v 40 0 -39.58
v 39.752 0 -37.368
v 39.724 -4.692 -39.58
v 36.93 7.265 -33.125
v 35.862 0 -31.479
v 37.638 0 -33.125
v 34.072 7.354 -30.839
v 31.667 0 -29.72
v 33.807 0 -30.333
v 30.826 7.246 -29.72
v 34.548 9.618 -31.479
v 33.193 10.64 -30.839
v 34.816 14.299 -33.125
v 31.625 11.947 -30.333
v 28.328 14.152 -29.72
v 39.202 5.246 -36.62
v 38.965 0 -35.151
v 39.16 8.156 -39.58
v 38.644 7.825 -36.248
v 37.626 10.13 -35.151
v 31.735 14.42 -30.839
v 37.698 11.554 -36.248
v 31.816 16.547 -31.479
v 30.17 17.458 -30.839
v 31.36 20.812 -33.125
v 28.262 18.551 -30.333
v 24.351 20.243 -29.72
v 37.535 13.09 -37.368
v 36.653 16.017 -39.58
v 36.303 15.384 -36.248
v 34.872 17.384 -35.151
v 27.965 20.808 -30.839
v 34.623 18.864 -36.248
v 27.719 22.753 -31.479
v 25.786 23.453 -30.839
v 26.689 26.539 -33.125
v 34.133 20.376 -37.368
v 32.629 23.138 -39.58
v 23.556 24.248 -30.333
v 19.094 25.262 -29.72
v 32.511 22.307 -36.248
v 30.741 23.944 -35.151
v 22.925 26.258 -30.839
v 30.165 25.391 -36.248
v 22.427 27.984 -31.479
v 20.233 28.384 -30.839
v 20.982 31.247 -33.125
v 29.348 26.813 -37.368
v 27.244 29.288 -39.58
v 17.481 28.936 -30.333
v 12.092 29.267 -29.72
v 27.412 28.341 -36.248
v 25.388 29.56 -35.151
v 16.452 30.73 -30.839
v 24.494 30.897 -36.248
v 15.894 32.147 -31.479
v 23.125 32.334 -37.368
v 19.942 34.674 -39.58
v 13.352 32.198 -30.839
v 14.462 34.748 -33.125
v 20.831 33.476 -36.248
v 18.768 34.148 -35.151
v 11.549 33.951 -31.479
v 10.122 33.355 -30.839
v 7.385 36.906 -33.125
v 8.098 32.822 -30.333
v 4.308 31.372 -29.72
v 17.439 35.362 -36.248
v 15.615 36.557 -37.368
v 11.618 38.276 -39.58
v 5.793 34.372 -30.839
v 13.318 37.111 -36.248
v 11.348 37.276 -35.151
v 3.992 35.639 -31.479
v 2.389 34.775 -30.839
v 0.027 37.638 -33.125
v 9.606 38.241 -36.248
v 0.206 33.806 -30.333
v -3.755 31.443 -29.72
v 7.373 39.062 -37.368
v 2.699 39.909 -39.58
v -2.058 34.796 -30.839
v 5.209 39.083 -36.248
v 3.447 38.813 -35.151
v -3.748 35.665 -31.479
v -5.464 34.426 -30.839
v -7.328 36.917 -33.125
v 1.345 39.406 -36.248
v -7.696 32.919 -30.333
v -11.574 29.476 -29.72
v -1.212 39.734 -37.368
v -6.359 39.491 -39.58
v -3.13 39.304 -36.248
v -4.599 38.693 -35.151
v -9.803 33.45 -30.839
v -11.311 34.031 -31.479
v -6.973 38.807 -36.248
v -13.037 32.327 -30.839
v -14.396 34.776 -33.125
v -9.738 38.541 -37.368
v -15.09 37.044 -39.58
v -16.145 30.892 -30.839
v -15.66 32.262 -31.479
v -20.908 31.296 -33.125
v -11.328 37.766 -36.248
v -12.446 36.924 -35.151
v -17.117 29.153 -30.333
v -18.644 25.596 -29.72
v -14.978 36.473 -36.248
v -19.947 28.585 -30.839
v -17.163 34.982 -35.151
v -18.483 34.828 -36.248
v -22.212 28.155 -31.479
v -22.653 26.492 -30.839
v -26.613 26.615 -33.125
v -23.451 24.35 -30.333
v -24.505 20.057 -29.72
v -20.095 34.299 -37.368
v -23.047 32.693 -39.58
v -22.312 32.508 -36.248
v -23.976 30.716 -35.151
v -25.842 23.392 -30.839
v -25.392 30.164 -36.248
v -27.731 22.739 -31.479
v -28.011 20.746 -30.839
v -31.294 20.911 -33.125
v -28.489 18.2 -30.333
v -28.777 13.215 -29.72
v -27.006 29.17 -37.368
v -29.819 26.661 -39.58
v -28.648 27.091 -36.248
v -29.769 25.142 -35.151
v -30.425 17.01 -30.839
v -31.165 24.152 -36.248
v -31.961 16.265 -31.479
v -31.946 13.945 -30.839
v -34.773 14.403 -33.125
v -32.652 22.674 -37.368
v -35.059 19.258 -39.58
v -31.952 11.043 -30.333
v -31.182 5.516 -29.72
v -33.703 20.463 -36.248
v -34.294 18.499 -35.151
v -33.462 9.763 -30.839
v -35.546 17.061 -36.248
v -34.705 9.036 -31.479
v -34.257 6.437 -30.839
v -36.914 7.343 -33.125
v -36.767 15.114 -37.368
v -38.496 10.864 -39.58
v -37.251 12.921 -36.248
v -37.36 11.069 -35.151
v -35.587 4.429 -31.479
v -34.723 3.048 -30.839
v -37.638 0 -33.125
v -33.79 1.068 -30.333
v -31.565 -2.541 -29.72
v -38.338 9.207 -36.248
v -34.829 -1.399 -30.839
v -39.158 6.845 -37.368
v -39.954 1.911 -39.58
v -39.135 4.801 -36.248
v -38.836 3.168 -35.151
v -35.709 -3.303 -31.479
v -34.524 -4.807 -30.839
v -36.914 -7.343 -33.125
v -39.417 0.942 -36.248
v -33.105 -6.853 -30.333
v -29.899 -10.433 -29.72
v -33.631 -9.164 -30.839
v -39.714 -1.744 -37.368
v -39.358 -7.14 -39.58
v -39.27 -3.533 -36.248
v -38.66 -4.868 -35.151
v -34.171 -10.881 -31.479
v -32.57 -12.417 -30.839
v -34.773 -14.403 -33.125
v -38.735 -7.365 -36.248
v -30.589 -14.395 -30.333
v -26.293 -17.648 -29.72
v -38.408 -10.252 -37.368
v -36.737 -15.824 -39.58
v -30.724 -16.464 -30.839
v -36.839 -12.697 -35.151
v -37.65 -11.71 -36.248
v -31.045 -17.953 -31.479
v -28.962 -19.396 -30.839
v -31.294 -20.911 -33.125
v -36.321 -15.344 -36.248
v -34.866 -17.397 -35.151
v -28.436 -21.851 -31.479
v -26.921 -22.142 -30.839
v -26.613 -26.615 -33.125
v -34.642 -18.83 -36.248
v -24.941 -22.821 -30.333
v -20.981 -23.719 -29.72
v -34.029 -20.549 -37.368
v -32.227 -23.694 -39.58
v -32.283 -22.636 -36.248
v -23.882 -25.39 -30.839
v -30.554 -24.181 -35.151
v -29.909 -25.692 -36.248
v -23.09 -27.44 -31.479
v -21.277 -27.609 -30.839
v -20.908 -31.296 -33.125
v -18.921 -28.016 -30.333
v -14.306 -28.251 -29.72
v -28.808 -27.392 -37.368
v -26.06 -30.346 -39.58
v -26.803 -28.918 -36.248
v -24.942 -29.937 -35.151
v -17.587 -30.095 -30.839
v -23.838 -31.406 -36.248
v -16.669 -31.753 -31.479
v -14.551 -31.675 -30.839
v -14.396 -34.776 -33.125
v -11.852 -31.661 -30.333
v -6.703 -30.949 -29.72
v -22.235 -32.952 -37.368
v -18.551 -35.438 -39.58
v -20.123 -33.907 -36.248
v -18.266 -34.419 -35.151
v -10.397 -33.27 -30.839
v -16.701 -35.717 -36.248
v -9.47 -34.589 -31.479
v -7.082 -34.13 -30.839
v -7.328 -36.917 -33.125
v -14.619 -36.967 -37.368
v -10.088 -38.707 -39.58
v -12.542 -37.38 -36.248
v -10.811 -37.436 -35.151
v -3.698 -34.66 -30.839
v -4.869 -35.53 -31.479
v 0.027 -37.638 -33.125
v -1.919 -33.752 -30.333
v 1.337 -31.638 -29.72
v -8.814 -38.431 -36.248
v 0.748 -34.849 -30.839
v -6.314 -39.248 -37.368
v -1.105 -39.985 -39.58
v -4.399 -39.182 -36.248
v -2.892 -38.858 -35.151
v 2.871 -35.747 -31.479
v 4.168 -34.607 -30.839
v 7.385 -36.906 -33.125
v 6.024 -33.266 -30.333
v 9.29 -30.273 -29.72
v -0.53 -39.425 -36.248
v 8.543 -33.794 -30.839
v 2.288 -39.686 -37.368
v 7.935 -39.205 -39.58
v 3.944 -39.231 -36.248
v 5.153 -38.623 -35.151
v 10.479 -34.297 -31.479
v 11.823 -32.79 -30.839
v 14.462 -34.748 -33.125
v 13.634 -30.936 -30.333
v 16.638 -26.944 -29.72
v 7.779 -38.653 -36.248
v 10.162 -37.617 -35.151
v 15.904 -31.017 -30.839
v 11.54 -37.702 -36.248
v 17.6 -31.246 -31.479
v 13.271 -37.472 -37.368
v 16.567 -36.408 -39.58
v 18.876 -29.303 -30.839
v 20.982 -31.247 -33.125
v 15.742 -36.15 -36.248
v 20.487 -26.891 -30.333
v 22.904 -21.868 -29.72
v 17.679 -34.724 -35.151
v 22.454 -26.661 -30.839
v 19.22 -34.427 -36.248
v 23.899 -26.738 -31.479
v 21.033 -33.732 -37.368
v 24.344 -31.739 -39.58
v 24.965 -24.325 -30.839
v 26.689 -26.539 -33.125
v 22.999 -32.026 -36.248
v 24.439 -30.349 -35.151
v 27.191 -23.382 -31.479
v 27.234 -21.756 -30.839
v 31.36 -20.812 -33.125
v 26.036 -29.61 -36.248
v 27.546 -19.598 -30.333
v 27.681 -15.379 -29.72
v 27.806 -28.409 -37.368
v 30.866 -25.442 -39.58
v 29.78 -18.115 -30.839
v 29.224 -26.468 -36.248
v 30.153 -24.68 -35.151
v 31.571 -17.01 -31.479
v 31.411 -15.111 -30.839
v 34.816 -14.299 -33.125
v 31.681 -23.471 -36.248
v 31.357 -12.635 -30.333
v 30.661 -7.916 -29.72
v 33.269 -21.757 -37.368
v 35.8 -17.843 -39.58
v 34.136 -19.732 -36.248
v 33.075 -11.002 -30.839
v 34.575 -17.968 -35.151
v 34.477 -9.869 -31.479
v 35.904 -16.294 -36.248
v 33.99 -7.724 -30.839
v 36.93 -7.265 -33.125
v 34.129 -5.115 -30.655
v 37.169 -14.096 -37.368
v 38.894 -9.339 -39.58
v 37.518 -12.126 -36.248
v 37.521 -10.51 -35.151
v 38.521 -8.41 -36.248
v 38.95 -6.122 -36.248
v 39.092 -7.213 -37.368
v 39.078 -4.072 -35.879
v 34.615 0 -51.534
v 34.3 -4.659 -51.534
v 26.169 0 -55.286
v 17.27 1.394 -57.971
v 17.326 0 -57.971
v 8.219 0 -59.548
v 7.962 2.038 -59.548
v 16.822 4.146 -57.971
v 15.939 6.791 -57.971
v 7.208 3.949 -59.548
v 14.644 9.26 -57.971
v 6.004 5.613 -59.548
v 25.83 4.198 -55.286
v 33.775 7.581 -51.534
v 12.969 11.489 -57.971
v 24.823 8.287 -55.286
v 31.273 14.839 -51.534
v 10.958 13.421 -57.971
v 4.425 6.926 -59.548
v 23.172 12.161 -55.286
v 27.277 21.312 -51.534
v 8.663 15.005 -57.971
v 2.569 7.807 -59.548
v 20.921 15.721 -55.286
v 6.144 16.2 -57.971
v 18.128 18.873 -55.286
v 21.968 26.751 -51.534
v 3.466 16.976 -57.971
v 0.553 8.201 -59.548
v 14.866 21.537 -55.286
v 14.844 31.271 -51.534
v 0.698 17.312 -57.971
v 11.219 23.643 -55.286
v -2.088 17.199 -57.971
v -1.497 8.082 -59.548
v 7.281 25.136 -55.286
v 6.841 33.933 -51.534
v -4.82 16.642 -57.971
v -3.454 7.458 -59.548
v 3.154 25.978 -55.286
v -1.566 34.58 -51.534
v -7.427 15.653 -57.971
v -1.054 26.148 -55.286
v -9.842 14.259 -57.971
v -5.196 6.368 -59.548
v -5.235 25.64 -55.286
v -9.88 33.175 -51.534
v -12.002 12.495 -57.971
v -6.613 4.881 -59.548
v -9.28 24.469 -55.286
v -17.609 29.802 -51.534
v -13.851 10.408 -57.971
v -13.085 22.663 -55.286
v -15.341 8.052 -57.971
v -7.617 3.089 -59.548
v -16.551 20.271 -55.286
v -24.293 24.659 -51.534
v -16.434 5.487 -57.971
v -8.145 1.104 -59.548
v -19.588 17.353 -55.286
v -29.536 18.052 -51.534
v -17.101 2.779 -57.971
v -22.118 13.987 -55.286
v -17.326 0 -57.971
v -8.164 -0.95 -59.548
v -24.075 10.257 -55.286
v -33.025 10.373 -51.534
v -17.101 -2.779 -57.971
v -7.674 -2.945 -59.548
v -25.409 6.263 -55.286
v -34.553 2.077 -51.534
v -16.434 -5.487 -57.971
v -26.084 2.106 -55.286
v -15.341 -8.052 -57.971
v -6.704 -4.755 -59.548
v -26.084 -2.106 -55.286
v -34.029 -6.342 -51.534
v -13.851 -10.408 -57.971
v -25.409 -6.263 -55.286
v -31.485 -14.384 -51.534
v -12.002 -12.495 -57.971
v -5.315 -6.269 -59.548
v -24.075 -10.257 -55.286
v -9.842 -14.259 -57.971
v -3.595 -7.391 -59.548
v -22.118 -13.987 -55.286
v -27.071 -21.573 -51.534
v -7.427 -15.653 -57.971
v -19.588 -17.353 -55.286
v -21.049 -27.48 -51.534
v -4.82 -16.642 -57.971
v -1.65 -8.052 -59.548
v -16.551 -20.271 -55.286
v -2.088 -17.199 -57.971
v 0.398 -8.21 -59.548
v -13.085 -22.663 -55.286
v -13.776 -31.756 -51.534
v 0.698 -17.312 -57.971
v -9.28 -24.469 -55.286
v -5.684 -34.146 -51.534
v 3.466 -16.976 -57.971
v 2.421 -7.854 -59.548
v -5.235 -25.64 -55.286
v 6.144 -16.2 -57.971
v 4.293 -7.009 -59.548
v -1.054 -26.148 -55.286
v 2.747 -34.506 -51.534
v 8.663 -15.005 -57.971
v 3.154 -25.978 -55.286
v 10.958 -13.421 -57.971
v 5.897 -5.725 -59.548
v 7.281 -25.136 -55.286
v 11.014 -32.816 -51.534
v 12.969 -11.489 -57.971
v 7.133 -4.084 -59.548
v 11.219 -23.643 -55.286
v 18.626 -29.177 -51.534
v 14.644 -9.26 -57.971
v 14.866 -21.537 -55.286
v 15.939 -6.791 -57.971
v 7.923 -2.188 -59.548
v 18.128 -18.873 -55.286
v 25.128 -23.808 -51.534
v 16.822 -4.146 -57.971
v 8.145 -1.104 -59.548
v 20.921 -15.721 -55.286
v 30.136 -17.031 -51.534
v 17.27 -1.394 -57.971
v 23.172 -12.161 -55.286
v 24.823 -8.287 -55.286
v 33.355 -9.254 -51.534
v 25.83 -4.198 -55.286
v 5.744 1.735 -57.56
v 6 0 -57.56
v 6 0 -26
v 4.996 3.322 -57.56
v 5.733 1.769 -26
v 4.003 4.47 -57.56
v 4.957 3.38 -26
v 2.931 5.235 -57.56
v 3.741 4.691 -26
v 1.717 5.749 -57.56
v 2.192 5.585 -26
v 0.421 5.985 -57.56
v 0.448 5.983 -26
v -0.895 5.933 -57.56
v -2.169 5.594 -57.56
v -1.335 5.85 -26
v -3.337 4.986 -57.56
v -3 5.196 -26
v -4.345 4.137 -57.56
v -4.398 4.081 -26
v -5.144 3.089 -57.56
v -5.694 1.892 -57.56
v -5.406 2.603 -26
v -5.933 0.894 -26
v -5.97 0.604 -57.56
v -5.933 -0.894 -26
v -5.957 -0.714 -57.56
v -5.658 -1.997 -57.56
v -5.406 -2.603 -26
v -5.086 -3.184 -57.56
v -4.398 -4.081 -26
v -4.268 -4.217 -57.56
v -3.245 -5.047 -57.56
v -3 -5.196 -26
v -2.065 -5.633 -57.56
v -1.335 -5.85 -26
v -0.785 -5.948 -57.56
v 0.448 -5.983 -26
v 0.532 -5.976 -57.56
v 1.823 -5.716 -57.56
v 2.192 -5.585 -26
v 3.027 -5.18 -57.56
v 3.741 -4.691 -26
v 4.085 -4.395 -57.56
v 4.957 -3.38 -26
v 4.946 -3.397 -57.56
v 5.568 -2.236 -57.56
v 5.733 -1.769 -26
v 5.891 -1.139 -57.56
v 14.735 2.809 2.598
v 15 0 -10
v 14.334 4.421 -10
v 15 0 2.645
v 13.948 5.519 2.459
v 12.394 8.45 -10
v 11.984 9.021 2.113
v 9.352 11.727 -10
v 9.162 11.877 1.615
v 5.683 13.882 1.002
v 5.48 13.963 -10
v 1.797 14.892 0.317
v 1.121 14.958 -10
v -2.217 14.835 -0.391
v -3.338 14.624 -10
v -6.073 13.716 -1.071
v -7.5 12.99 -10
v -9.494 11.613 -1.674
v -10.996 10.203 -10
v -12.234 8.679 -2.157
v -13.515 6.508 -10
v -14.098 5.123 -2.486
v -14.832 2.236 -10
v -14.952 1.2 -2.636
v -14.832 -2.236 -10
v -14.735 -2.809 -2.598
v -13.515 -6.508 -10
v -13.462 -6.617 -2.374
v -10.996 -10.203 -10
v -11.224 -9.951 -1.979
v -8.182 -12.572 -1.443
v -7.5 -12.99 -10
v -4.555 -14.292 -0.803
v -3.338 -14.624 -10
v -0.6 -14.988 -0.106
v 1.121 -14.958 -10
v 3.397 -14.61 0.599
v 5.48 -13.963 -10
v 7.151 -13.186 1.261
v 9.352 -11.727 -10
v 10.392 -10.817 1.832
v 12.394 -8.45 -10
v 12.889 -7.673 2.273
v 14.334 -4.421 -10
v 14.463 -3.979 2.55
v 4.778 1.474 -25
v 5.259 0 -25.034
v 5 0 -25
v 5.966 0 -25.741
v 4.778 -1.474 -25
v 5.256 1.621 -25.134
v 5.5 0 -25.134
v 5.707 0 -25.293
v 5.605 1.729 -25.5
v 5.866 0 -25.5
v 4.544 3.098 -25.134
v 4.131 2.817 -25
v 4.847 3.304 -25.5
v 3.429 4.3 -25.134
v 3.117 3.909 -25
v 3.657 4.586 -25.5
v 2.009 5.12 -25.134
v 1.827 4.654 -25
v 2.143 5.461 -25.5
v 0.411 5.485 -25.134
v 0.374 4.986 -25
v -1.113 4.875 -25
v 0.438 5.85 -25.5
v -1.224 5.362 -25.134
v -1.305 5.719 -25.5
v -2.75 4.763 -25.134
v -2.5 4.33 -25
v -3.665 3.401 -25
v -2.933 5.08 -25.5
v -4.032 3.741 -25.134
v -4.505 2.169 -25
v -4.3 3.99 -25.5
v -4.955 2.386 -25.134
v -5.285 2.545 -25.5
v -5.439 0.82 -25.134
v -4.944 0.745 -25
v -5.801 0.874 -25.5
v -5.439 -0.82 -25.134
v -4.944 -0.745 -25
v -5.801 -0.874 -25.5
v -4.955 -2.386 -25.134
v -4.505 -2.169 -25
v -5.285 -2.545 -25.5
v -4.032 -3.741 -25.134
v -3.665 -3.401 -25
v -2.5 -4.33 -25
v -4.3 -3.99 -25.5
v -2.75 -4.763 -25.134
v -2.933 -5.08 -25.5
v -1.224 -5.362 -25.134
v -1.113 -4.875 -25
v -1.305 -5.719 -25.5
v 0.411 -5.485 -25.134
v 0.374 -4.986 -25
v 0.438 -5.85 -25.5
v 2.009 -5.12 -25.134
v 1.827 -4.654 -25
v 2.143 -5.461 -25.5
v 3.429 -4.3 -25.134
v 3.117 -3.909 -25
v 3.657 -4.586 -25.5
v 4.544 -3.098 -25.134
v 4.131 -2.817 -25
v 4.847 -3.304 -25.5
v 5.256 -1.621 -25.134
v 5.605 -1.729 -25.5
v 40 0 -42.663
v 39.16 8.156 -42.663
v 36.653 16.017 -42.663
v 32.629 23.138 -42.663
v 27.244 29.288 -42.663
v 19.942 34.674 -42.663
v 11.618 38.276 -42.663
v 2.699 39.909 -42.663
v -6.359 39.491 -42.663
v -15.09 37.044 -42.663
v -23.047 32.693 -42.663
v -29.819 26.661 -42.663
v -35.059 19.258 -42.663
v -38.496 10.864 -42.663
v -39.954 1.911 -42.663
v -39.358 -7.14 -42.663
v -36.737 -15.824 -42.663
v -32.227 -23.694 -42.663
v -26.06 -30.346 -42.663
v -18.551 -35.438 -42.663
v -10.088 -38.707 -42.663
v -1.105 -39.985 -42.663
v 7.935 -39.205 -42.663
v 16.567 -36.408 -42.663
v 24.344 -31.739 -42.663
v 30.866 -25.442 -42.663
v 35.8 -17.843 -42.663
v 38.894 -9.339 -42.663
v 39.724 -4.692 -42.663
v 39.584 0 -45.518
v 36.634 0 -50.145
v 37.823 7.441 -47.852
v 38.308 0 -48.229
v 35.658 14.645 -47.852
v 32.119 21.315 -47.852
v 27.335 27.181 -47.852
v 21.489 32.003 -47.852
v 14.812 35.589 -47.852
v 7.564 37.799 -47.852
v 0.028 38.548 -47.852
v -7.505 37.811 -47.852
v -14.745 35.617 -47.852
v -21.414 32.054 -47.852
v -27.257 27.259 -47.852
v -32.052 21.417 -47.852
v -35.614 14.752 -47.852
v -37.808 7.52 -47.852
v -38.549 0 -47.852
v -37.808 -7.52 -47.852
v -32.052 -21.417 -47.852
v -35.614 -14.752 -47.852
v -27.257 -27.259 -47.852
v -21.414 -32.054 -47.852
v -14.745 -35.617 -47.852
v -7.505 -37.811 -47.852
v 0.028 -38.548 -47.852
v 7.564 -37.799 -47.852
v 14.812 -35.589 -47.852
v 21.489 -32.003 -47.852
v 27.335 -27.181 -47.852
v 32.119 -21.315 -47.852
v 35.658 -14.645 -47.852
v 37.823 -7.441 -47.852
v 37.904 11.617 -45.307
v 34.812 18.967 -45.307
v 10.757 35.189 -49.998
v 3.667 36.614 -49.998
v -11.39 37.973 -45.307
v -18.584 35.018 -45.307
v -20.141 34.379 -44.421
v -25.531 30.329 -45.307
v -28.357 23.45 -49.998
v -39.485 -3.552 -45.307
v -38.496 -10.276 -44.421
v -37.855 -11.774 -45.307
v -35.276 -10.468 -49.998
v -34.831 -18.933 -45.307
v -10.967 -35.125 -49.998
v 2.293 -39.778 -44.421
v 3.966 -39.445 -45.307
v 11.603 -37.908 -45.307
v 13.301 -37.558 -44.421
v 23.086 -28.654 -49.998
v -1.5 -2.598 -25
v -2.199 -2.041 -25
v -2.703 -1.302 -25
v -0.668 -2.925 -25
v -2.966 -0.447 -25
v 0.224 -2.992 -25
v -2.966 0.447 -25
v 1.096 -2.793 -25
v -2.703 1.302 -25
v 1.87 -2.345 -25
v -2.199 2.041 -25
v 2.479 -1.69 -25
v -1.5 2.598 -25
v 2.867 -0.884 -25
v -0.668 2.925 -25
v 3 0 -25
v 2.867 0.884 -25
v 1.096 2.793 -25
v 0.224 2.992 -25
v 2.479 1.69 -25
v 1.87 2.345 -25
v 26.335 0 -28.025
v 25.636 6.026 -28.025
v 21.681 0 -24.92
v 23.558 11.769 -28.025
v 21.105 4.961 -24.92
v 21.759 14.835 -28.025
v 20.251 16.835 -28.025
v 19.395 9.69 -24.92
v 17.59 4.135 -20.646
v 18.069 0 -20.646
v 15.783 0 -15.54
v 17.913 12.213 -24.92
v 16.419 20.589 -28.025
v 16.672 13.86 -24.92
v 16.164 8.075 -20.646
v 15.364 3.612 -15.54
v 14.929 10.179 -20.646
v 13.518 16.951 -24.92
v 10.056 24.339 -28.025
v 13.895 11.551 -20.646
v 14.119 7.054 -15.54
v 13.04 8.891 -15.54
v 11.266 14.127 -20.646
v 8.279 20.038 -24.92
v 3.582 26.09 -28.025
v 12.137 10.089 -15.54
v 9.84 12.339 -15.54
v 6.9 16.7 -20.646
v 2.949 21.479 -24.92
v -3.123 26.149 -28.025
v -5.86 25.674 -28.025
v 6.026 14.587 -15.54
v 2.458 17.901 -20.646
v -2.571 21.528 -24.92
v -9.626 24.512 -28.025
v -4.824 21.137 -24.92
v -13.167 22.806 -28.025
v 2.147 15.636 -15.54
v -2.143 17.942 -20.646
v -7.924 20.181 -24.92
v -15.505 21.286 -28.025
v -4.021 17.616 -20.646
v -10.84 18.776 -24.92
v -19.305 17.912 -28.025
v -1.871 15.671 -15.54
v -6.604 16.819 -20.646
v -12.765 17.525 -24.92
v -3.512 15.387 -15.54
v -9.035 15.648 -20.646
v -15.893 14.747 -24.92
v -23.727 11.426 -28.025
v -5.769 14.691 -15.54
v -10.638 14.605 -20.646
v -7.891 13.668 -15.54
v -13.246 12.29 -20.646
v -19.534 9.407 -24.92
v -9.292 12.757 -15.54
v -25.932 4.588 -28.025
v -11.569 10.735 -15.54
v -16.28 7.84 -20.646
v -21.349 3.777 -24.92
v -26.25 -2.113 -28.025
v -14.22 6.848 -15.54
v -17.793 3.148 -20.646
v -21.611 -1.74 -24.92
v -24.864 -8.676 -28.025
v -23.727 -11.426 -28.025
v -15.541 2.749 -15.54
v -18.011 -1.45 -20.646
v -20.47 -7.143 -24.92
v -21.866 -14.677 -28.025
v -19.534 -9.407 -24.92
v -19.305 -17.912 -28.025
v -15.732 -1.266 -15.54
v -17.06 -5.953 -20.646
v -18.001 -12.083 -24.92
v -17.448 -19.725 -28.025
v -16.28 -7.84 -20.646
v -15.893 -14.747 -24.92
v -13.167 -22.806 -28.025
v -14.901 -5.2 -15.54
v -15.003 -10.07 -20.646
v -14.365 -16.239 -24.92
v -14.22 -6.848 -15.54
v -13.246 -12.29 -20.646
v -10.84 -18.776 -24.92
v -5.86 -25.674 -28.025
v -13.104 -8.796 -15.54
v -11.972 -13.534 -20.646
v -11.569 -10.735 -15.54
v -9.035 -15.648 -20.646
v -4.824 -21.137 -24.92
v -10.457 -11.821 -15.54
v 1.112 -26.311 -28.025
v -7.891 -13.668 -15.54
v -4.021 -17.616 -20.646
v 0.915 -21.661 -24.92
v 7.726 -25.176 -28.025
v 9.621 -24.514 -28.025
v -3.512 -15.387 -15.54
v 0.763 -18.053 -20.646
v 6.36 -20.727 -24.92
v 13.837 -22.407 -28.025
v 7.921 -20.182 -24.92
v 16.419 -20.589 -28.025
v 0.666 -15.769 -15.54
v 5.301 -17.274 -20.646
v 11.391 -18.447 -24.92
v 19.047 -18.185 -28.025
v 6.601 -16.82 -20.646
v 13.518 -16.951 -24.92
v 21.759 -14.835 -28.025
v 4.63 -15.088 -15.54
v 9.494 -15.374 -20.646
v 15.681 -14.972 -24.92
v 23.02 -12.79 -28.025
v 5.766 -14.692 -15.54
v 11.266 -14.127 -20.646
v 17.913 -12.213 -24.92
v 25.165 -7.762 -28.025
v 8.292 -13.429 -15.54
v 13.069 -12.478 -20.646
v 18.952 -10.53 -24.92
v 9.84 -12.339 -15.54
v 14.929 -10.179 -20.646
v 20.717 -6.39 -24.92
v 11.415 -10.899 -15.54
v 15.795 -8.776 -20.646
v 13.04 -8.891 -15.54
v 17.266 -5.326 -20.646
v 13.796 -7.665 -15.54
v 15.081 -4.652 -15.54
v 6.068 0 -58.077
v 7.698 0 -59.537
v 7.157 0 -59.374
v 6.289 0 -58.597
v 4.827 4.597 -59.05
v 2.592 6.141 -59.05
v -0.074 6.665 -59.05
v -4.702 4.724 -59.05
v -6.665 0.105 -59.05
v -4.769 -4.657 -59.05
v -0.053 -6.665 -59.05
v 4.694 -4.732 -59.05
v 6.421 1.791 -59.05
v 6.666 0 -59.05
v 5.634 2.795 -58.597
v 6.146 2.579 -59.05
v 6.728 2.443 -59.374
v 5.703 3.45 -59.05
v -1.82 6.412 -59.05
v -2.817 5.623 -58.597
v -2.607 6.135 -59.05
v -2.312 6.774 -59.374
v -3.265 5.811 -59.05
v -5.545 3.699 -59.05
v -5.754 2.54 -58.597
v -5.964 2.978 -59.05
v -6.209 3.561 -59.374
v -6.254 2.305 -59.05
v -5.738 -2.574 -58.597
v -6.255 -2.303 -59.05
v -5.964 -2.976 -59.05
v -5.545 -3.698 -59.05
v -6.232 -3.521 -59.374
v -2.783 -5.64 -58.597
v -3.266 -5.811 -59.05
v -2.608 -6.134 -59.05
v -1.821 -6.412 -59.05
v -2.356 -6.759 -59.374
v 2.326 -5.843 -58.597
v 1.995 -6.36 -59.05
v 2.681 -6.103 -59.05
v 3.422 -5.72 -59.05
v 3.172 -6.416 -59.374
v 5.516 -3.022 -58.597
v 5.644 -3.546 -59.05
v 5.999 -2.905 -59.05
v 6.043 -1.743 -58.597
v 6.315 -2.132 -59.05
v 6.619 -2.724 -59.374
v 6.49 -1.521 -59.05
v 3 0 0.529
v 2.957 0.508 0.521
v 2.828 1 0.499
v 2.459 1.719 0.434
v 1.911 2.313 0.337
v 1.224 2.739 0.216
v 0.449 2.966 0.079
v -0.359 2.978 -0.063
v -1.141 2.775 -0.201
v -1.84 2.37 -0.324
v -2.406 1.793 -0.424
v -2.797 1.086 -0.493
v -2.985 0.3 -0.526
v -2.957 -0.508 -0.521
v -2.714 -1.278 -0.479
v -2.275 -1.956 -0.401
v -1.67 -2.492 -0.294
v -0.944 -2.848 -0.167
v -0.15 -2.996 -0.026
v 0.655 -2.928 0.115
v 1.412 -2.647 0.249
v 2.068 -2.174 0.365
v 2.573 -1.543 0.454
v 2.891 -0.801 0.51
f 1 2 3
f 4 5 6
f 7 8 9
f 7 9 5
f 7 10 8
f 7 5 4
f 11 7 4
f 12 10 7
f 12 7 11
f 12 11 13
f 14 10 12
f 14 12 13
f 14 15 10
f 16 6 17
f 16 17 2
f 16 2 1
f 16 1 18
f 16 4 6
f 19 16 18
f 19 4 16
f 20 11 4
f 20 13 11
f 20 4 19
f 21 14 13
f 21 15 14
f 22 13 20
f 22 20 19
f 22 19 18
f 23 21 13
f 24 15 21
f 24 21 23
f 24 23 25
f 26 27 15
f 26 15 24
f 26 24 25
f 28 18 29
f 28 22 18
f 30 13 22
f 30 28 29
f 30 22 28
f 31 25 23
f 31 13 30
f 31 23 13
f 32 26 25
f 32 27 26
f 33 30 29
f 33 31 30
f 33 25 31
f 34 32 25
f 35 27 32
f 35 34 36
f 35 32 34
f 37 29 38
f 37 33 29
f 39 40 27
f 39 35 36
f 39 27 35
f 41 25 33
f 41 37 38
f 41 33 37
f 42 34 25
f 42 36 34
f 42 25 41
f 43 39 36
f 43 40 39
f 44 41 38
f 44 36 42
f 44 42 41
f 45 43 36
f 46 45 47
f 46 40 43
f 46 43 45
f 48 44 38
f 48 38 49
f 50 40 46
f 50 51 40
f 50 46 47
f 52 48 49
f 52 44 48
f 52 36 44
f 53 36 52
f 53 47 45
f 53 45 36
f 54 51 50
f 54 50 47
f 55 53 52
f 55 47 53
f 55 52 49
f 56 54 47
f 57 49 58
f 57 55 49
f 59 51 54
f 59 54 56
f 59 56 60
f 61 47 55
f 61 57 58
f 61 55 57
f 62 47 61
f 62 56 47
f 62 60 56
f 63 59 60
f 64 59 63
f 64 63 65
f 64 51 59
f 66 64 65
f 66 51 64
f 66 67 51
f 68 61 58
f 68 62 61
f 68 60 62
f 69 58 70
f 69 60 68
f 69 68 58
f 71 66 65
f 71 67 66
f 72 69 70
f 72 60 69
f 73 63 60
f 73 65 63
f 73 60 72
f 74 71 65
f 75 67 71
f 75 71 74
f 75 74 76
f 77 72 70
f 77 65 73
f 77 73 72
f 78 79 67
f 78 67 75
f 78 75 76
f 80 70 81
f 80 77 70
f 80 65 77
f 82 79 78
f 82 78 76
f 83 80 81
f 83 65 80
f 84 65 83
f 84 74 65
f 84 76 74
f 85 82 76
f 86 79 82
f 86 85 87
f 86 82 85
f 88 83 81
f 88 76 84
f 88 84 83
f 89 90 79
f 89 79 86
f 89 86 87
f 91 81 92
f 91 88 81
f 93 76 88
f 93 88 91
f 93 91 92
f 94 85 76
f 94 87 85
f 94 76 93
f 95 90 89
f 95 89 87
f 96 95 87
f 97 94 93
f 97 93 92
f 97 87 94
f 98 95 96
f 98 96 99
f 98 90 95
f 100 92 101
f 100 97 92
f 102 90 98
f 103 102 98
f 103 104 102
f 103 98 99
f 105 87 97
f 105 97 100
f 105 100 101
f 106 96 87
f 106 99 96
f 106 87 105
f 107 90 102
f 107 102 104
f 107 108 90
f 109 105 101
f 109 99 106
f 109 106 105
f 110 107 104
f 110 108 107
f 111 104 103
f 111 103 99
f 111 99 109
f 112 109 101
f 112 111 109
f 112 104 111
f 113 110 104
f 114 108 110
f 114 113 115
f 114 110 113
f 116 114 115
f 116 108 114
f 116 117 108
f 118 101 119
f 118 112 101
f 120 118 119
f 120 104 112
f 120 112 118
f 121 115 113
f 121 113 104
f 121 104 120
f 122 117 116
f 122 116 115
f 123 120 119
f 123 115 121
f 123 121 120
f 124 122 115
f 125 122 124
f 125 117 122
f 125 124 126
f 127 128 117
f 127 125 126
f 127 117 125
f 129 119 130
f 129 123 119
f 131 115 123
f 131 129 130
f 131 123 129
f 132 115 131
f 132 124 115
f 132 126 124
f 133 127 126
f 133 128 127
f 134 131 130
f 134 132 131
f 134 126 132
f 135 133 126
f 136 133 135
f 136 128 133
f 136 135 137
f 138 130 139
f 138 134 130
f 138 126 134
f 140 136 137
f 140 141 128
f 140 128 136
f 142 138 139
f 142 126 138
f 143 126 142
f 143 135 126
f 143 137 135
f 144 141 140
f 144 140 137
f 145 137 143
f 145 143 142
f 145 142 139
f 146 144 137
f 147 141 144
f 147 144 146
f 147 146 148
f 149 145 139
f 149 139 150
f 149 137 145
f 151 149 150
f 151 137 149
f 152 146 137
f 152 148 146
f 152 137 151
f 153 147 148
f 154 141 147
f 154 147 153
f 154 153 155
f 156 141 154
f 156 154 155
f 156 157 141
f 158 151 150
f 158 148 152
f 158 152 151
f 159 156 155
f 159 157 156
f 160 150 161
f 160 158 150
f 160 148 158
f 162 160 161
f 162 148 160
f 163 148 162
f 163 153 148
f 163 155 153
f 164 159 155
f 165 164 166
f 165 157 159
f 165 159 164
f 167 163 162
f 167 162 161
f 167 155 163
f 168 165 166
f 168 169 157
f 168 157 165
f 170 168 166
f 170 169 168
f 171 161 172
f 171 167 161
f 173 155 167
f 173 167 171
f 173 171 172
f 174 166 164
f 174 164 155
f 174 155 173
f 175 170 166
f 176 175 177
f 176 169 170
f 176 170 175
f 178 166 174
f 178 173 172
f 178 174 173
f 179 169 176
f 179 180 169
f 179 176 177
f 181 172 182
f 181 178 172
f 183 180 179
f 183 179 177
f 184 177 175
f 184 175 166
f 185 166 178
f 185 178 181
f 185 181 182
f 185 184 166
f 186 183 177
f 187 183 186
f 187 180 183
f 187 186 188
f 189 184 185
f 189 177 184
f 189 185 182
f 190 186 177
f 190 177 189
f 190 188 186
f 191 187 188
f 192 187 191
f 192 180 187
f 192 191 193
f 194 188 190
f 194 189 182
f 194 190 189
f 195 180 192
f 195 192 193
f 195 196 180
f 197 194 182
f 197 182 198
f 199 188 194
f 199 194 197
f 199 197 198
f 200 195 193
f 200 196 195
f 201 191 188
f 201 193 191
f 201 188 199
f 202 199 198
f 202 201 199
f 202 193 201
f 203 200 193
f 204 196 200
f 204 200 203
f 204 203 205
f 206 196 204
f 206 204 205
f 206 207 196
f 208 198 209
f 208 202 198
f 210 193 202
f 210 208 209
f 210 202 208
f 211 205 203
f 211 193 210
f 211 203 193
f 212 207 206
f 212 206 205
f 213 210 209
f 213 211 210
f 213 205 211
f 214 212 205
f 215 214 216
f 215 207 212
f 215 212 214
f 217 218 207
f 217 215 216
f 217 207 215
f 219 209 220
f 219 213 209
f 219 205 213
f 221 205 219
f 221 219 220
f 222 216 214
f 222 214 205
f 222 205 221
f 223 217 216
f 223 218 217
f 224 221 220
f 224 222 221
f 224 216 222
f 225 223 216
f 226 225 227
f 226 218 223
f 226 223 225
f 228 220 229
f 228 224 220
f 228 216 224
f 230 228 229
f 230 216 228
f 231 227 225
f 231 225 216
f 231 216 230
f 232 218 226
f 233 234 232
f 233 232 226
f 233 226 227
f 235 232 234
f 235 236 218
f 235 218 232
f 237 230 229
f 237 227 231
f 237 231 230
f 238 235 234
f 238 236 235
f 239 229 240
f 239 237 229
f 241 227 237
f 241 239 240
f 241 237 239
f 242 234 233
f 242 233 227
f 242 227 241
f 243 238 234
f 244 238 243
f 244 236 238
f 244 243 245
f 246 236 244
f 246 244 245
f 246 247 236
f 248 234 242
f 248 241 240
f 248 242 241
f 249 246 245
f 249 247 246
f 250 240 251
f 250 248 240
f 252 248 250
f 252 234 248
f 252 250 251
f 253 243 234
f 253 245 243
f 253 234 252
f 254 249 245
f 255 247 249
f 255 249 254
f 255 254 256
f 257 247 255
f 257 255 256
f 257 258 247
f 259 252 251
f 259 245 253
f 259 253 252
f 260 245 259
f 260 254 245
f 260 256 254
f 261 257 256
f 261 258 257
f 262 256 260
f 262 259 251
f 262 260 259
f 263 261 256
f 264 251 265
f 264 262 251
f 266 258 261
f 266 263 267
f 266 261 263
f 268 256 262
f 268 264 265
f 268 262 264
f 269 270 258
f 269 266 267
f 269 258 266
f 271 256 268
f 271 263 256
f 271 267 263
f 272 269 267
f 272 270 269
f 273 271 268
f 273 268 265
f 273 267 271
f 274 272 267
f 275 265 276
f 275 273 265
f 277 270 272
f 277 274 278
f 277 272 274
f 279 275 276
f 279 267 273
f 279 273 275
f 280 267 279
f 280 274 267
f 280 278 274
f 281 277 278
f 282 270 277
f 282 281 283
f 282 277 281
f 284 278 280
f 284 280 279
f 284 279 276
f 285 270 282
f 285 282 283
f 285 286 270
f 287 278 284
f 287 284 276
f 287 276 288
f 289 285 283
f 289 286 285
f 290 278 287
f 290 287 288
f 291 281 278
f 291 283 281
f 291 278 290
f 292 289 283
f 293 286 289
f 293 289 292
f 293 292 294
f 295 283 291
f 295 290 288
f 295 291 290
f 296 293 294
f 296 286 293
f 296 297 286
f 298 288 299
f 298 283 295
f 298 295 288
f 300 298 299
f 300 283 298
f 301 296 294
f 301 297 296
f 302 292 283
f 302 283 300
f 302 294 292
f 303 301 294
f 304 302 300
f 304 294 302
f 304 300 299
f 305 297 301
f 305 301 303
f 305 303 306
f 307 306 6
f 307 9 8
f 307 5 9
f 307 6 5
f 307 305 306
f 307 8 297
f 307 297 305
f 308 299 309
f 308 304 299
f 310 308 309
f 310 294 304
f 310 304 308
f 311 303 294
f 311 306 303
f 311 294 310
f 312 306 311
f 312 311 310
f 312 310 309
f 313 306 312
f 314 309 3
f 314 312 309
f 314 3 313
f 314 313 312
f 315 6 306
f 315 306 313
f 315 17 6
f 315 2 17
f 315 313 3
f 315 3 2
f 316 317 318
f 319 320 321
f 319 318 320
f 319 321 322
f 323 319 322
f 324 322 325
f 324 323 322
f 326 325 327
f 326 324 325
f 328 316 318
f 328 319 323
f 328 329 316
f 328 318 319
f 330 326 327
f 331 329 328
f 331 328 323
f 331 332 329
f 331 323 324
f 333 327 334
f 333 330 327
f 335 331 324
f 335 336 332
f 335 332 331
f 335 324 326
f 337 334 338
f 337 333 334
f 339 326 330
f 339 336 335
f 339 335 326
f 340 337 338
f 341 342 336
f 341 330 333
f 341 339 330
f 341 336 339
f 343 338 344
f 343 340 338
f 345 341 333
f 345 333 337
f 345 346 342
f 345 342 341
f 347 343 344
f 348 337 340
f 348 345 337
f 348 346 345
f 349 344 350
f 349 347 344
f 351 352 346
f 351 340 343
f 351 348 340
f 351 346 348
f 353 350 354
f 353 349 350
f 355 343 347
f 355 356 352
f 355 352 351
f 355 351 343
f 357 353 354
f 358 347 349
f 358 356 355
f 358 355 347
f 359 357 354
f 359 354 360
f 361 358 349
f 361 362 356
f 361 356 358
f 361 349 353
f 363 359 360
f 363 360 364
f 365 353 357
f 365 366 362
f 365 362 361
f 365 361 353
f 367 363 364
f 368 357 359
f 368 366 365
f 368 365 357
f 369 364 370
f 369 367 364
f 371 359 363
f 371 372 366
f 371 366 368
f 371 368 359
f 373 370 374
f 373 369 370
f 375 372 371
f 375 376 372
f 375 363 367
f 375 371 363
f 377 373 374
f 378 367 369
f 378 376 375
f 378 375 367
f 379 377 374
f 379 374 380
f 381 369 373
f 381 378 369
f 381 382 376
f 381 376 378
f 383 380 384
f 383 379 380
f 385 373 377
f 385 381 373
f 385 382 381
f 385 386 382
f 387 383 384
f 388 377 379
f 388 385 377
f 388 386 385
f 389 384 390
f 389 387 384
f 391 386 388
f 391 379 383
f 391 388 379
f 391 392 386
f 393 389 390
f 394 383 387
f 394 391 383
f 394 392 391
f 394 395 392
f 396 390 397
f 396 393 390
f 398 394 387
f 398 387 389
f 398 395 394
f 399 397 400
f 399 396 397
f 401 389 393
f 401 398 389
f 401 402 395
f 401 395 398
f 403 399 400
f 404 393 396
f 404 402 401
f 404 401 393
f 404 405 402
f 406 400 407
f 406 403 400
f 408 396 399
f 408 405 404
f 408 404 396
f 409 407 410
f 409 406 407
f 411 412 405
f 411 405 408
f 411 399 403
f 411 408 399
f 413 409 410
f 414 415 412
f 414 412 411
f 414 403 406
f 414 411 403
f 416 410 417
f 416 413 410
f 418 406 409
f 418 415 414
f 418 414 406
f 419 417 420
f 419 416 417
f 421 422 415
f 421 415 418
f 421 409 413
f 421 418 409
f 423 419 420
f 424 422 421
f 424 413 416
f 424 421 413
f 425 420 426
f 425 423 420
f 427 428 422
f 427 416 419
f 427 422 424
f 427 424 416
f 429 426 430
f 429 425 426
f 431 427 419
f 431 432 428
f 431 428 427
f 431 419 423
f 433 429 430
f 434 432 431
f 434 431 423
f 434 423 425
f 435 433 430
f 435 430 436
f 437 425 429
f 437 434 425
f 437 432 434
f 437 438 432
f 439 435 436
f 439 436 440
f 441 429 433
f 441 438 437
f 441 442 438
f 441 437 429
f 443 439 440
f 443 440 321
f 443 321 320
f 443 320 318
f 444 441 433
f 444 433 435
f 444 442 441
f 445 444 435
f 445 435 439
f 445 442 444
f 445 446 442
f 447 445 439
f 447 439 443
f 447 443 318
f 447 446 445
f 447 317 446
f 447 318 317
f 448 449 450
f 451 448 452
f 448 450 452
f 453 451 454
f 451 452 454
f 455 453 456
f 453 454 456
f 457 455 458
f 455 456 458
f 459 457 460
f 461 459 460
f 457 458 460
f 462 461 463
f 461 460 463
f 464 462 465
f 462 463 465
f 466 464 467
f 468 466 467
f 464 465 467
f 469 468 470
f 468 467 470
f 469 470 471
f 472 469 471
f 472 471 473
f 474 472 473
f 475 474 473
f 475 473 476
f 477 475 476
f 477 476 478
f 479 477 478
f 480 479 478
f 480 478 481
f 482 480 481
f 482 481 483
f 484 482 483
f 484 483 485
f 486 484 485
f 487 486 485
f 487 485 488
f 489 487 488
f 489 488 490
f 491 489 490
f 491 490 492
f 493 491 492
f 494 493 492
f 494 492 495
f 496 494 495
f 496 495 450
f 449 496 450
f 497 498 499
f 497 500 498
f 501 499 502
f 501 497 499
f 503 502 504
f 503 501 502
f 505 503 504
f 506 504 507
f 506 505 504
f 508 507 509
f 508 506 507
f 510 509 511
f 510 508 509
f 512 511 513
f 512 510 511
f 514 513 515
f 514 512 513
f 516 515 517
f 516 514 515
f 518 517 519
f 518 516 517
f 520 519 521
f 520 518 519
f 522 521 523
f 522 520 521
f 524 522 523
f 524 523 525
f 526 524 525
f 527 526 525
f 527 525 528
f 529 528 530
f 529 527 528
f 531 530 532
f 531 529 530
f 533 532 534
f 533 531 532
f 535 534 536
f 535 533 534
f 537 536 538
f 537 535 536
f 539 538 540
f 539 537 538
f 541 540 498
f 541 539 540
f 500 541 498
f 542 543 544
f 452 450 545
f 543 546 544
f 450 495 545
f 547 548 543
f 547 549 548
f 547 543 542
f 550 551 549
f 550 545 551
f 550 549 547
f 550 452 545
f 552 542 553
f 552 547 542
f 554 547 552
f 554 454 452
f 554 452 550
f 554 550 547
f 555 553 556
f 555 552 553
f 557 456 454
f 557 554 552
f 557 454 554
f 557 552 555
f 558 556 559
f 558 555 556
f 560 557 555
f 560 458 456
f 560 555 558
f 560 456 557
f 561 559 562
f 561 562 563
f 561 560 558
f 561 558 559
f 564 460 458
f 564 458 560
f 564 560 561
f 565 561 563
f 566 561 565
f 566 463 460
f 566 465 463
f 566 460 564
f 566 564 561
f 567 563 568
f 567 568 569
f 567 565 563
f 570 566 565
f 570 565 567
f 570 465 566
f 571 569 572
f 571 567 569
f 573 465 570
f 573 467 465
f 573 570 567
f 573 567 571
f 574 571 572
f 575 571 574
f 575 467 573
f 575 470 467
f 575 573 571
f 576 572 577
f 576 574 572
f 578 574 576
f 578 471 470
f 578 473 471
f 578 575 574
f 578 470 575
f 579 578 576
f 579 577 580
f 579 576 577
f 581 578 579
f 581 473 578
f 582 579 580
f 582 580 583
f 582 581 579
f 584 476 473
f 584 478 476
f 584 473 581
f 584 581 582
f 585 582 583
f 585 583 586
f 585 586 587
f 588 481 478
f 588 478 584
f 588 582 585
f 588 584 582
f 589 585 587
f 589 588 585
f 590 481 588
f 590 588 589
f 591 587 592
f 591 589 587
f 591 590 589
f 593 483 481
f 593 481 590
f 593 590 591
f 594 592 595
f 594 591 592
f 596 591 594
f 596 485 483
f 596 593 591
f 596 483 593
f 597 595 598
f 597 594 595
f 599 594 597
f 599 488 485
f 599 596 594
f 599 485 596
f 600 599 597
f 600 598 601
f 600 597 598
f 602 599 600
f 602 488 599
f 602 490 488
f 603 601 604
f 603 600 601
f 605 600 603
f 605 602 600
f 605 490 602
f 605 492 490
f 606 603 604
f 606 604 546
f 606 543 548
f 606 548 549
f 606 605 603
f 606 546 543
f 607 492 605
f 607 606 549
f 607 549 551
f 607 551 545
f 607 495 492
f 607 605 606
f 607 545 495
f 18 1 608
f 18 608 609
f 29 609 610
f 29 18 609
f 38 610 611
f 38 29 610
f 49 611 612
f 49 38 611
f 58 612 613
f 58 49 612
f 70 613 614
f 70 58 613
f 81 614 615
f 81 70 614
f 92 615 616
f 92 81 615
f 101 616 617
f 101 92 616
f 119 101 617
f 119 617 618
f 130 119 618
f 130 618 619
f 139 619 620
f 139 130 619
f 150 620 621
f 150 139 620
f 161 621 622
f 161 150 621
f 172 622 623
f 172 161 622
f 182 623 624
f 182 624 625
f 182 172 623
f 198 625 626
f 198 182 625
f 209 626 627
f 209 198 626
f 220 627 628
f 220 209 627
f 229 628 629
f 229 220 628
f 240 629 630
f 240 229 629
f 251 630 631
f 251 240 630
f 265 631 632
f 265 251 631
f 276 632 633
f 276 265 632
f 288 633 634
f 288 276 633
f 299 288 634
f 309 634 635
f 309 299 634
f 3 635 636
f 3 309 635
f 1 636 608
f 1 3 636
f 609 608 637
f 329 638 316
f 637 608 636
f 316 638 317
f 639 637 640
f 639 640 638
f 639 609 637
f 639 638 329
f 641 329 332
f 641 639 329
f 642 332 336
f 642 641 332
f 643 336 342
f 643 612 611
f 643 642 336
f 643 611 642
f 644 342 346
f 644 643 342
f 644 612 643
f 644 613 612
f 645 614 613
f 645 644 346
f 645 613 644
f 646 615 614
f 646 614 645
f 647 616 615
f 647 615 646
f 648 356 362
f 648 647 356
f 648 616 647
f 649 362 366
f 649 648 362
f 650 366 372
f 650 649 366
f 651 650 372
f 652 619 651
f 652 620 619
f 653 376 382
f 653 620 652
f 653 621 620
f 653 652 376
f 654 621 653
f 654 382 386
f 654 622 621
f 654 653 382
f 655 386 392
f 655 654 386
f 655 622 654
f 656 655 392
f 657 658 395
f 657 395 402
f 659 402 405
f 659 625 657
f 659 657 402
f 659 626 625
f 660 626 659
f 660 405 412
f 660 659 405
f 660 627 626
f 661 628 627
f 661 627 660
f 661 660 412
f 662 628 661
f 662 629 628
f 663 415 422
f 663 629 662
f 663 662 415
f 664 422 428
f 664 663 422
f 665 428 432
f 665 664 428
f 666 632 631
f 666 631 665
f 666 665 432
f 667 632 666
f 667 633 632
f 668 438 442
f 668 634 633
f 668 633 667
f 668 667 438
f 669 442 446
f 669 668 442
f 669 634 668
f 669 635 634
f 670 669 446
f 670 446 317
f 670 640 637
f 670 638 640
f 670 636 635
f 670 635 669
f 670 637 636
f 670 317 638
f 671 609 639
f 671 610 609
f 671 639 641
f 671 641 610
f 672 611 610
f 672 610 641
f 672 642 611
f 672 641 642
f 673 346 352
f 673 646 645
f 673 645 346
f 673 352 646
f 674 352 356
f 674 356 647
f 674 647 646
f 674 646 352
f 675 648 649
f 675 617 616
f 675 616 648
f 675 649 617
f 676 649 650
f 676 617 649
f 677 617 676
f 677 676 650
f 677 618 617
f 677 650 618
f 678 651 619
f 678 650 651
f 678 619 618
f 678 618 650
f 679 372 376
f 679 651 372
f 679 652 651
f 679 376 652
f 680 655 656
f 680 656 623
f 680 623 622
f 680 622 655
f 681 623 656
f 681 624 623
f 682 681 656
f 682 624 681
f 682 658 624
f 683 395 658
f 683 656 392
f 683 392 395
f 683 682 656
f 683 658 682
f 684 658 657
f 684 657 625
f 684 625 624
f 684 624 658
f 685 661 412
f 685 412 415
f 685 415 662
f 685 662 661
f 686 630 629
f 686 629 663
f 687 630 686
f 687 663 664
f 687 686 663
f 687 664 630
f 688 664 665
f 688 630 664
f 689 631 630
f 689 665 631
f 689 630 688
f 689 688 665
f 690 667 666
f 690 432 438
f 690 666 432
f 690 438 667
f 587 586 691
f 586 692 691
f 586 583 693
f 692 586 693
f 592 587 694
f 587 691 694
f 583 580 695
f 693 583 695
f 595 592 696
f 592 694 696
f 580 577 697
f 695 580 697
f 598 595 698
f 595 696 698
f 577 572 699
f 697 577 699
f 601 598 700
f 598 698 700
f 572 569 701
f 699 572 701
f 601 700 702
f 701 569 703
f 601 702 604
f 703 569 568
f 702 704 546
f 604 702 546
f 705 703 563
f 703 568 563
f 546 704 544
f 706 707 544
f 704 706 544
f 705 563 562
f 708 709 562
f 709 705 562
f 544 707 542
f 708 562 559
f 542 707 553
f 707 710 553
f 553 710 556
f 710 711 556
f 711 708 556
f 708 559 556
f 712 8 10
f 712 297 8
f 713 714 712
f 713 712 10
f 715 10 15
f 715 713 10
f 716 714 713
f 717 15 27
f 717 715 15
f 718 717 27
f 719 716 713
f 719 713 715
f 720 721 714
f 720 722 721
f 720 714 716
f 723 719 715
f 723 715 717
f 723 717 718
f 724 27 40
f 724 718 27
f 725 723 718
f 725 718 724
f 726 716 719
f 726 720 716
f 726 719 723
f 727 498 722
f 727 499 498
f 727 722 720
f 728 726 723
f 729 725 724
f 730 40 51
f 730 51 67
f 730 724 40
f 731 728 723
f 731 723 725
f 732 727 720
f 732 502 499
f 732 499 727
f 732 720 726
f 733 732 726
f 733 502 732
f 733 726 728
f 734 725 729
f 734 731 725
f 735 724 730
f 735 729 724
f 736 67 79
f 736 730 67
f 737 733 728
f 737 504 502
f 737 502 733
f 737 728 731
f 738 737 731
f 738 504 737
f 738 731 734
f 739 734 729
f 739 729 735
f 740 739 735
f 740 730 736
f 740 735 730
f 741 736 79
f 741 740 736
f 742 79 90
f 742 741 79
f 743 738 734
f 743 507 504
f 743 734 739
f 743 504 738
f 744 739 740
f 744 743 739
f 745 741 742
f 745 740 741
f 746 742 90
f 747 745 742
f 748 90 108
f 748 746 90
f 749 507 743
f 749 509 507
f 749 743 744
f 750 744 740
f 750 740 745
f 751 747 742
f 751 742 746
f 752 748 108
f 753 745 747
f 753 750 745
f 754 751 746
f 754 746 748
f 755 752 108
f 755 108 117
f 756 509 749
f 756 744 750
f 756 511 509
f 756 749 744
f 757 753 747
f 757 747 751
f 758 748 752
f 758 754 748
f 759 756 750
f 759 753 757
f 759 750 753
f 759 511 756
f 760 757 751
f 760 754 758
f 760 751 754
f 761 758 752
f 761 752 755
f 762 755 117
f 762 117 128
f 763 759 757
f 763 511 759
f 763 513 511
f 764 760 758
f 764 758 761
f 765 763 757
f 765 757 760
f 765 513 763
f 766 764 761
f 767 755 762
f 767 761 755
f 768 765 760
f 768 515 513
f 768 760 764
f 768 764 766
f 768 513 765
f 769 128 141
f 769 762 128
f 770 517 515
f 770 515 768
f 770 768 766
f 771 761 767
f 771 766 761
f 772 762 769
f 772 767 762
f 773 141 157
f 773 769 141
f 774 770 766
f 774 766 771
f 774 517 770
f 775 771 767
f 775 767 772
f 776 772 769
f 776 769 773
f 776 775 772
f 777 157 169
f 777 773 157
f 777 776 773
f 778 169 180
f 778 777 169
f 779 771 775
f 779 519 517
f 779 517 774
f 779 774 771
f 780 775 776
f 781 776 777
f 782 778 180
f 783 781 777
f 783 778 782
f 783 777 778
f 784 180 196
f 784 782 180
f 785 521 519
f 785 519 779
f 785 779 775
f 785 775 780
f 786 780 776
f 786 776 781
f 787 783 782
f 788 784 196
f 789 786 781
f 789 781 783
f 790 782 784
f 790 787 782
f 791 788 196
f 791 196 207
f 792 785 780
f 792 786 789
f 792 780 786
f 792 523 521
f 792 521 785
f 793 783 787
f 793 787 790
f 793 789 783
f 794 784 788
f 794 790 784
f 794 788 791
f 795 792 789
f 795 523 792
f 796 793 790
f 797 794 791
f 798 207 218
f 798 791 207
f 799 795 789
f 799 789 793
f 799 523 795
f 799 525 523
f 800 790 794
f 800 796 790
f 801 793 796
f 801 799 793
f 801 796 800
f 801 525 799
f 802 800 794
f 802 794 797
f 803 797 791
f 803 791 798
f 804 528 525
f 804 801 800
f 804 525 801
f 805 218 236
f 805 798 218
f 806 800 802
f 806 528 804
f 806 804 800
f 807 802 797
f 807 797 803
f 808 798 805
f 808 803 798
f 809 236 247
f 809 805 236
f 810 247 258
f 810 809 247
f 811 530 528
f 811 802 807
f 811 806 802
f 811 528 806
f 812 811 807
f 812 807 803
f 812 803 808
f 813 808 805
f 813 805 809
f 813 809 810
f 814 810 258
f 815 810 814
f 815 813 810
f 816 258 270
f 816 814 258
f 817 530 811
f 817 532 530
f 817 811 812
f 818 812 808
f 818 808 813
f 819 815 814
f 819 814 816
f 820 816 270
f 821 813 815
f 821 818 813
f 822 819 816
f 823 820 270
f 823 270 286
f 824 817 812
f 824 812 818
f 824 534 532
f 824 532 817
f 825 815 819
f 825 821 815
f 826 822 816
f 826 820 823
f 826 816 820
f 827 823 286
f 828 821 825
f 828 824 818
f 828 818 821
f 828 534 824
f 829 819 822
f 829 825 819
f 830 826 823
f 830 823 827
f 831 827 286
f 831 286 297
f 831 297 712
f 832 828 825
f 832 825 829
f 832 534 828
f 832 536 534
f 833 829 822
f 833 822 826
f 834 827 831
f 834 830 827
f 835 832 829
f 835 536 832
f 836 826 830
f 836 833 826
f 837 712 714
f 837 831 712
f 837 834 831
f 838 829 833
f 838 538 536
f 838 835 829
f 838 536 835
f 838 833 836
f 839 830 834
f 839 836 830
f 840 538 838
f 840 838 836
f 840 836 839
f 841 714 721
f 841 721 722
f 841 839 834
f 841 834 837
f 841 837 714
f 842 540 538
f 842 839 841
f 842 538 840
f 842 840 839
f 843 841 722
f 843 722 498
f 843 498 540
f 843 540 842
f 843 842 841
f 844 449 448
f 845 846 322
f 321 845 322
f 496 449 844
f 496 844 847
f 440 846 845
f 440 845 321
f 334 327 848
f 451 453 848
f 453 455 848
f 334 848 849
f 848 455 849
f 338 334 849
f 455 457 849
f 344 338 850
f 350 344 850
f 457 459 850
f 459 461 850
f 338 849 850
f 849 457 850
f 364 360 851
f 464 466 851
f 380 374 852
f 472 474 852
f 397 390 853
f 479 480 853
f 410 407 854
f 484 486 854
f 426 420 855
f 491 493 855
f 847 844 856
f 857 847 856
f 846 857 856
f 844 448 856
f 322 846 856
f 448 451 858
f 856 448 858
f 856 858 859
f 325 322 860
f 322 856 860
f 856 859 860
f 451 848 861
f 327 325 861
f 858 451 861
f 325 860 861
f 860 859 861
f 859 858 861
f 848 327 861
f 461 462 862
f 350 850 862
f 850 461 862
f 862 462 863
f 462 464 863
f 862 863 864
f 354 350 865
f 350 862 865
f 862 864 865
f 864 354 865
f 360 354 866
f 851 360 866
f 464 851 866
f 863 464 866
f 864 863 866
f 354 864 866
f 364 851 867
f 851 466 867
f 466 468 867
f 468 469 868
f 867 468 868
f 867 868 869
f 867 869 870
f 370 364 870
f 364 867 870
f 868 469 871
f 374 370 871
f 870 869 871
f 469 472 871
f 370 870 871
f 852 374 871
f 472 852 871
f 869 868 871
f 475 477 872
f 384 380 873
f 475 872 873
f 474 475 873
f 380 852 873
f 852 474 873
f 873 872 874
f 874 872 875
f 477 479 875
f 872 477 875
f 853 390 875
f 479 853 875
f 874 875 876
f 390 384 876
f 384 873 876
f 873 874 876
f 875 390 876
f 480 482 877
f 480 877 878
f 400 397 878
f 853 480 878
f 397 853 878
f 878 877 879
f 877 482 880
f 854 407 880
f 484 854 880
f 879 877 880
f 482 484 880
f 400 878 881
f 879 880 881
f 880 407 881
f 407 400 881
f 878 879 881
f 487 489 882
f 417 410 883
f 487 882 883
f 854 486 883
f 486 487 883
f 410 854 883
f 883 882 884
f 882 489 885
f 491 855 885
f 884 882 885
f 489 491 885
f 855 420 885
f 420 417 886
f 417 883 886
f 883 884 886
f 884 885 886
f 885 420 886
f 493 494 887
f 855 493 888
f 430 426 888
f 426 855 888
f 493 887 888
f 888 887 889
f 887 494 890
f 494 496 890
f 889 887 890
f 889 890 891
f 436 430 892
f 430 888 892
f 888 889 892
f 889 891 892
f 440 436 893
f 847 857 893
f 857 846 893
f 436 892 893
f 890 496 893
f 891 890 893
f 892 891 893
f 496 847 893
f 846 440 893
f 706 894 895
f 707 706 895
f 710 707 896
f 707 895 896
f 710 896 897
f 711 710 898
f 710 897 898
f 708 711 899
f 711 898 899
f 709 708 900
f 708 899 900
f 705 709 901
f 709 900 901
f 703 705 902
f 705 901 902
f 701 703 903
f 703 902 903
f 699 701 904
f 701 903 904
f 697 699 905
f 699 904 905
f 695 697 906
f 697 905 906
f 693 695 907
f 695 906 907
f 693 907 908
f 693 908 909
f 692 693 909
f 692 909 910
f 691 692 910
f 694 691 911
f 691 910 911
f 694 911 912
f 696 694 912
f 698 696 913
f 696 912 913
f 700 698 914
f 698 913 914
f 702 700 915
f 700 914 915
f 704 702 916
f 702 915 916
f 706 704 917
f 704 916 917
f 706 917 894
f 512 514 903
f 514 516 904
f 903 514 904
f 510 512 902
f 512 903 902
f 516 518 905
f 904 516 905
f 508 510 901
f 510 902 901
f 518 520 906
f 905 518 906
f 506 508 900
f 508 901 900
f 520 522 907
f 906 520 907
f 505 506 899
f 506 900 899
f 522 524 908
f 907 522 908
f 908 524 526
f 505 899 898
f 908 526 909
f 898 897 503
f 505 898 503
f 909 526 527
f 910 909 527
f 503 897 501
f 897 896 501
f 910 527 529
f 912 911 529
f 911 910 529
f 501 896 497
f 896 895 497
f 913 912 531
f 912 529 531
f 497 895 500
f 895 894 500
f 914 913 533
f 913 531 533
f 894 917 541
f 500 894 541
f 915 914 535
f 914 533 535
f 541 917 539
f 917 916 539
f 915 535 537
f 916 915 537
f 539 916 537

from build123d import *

# Parameters (mm, degrees)
F0_W      = 15
F0_H      = 5
F2_R      = 20
F3_R      = 10
F4_R      = 3
F5_DEPTH  = 100
F7_START  = -25
F6_R      = 6
F7_DEPTH  = 75
F8_R      = 1
F9_R      = 2
F11_DEPTH = 25


with BuildPart() as f1:
    # F0 (on Front) → F1 (revolve)
    with BuildSketch(Plane.XZ):
        with BuildLine():
            Line((0, 0), (0, -60))
            ThreePointArc((0, -60), (20.8180621376, -57.0528159674), (40, -48.4428877022))
            Line((40, -48.4428877022), (40, -30))
            Line((40, -30), (15, -30))
            Line((15, -30), (15, 0))
            Line((15, 0), (0, 0))
        make_face()
        with Locations((7.5, 2.5)):
            Rectangle(F0_W, F0_H)
    revolve(axis=Axis((0, 0, -30), (0, 0, 1)))

    # F2
    f2_edges = [f1.edges().sort_by_distance(p)[0] for p in [
        (-15, 0, -30),
    ]]
    fillet(f2_edges, radius=F2_R)

    # F3
    f3_edges = [f1.edges().sort_by_distance(p)[0] for p in [
        (-40, 0, -48.442888),
        (-40, 0, -30),
    ]]
    fillet(f3_edges, radius=F3_R)

    # F4 (on Top) → F5 (cut, symmetric)
    with BuildSketch(Plane.XY):
        Circle(F4_R)
    extrude(amount=F5_DEPTH, both=True, mode=Mode.SUBTRACT)

    # F6 (on Top) → F7 (cut)
    with BuildSketch(Plane.XY.offset(F7_START)):
        Circle(F6_R)
    extrude(amount=-F7_DEPTH, mode=Mode.SUBTRACT)

    # F8
    f8_edges = [f1.edges().sort_by_distance(p)[0] for p in [
        (-6, 0, -25),
    ]]
    fillet(f8_edges, radius=F8_R)

    # F9
    f9_edges = [f1.edges().sort_by_distance(p)[0] for p in [
        (-6, 0, -59.759615),
    ]]
    fillet(f9_edges, radius=F9_R)

    # F10 (on Front) → F11 (cut, symmetric)
    with BuildSketch(Plane.XZ):
        Polygon((-50, -8.8163490354), (50, 8.8163490354), (-50, 8.8163490354), align=None)
    extrude(amount=F11_DEPTH, both=True, mode=Mode.SUBTRACT)


solid = f1.part
